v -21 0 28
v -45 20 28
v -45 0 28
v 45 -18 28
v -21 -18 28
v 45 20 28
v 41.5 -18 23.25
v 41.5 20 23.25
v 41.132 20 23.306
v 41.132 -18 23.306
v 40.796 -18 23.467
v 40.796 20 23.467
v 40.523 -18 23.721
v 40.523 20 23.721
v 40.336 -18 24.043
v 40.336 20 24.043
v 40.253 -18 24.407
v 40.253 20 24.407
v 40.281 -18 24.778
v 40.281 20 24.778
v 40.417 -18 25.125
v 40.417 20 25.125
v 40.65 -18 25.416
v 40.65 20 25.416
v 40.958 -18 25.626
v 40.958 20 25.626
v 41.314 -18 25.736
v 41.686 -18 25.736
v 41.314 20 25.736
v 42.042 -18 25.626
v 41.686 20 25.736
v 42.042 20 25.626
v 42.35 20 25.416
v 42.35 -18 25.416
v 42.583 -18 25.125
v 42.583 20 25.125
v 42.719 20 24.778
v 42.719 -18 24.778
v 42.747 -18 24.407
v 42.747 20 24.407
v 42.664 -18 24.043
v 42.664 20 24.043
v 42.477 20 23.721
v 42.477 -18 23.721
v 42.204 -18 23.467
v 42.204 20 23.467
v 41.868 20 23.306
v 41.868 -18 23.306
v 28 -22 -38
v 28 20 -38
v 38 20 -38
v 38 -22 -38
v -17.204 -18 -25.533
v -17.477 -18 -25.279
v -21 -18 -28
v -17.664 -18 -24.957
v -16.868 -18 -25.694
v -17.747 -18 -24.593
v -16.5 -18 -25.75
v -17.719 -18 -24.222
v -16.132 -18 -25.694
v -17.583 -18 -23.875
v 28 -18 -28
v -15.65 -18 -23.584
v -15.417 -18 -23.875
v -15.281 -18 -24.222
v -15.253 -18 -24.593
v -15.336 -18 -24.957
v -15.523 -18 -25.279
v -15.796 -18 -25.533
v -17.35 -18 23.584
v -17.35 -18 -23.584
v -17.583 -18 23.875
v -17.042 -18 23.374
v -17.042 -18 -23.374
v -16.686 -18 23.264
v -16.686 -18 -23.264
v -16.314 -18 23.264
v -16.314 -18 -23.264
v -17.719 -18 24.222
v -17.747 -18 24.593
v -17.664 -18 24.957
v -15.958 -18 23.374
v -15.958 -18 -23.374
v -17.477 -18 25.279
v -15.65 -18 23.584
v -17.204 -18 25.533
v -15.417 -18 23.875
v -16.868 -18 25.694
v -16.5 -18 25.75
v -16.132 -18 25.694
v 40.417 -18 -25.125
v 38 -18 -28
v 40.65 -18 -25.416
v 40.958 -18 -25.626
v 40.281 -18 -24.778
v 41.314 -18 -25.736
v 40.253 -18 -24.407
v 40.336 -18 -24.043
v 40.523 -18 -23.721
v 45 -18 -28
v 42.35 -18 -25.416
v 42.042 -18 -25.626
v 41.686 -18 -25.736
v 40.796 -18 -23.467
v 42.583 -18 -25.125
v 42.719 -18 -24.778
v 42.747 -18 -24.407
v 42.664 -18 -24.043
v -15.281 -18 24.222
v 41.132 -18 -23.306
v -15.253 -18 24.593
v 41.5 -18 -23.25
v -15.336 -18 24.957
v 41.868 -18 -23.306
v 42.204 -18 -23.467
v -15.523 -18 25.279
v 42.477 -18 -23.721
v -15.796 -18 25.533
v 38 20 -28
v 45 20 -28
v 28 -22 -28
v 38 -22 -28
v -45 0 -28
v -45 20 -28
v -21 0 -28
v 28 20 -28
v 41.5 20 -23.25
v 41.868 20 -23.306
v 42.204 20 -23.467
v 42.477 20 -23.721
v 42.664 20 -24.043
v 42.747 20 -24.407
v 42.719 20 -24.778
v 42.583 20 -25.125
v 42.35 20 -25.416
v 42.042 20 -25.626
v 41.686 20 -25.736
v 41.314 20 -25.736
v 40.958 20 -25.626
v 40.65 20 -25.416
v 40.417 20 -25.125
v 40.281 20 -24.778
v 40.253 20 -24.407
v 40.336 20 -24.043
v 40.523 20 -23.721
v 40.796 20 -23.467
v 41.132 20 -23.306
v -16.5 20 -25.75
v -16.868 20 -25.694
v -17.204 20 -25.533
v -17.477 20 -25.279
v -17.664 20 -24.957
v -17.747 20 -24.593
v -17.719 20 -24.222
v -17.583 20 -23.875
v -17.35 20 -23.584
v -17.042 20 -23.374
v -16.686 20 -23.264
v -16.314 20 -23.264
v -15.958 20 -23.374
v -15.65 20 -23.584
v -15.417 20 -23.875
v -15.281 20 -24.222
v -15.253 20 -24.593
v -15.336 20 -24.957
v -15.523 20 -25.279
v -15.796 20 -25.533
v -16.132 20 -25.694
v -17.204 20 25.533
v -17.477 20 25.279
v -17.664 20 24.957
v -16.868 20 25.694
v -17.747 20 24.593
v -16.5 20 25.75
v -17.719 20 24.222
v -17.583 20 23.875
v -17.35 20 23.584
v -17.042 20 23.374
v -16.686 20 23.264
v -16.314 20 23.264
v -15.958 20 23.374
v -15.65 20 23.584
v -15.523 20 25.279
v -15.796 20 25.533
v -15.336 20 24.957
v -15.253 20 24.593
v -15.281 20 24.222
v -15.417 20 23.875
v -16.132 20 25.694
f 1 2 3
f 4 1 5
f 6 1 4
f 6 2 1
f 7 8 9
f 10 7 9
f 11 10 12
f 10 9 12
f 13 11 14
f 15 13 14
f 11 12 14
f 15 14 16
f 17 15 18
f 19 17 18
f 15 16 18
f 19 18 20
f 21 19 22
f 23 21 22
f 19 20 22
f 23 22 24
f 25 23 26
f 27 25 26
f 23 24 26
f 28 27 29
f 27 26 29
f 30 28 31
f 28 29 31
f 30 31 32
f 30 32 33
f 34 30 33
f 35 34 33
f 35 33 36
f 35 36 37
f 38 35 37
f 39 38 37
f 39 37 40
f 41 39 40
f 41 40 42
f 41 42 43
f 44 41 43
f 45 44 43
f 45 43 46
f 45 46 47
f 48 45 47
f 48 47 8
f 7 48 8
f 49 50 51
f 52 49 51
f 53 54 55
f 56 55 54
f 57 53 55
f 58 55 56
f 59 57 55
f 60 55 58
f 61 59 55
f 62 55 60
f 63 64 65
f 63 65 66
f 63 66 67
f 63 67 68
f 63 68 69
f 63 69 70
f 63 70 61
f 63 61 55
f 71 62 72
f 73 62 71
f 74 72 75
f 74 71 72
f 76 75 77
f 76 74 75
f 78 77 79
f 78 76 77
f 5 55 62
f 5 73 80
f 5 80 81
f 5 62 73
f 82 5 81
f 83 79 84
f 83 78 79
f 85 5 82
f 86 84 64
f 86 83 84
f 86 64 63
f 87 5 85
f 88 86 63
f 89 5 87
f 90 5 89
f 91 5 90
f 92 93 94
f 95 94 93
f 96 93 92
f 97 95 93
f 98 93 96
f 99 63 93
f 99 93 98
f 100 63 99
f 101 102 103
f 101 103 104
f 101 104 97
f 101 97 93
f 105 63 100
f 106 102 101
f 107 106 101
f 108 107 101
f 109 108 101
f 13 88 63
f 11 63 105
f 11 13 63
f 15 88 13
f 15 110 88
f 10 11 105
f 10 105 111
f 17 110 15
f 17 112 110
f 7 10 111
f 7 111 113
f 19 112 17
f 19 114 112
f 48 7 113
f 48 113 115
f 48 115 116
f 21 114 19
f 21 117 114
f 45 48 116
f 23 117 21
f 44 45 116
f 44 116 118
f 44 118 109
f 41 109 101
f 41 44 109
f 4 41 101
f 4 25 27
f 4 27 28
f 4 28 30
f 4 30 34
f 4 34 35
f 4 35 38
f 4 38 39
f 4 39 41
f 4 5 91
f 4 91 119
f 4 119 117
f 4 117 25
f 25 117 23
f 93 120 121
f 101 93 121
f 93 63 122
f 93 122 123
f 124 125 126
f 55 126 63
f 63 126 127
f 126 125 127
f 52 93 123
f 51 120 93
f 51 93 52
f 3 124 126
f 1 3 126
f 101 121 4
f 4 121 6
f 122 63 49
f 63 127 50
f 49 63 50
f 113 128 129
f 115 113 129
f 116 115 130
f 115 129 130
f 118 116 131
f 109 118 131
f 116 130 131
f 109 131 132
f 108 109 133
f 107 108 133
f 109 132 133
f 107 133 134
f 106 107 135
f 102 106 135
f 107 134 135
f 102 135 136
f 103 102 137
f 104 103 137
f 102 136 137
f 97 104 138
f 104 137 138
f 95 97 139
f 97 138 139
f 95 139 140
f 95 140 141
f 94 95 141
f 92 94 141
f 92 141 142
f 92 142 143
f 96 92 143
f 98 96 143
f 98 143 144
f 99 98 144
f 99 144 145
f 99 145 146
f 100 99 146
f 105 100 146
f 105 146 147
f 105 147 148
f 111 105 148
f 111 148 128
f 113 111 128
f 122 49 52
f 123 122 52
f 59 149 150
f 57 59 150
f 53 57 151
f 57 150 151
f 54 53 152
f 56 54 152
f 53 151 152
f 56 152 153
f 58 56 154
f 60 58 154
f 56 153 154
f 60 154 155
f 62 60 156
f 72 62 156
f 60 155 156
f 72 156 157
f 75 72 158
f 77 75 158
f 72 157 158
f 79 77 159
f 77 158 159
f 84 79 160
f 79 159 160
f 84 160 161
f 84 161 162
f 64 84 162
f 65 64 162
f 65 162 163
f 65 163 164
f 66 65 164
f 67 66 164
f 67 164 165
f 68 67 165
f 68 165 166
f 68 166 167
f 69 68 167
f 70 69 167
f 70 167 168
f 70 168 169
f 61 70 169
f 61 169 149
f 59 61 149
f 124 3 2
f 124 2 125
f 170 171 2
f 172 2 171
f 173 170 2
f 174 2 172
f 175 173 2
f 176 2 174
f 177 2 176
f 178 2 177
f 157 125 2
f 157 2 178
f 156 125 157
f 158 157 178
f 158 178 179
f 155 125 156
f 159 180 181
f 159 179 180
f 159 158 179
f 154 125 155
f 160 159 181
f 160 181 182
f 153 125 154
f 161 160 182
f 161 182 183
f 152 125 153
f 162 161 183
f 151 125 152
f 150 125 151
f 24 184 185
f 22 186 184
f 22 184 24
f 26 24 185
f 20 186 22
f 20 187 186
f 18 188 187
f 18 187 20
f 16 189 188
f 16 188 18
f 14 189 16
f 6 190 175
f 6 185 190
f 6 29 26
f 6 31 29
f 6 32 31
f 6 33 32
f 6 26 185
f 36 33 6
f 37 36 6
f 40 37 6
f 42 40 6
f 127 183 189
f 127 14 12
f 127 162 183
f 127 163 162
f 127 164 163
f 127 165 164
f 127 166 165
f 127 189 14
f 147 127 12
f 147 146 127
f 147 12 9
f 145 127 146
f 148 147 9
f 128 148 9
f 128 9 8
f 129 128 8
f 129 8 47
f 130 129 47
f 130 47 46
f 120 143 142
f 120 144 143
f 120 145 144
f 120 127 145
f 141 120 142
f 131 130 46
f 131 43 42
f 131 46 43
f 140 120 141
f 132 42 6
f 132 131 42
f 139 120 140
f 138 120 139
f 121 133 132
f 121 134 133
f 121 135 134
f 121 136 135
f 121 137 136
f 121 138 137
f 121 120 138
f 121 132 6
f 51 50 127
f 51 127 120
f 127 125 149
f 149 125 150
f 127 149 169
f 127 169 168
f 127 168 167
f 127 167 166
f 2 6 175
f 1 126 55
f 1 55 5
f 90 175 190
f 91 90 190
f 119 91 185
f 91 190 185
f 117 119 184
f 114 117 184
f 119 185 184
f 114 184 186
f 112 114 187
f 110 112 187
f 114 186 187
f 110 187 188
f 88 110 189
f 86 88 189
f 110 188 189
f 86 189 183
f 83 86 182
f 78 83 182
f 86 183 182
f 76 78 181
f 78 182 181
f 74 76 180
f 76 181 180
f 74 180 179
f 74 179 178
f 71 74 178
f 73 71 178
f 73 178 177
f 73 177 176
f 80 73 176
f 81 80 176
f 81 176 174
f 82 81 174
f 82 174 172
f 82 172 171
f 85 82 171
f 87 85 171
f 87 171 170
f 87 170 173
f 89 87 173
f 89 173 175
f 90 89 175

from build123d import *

# Parameters (mm, degrees)
SKETCH_1_W          = 90
SKETCH_1_H          = 56
EXTRUDE_1_DEPTH     = 20
SKETCH_4_W          = 66
SKETCH_4_H          = 56
EXTRUDE_3_DEPTH     = 18
SKETCH_2_R          = 1.25
CUT_EXTRUDE_1_DEPTH = 60
SKETCH_5_W          = 10
SKETCH_5_H          = 10
EXTRUDE_4_DEPTH     = 42


with BuildPart() as part:
    # 草图1 → 凸台-拉伸1 (new body)
    with BuildSketch(Plane(origin=(0, 0, 0), x_dir=(1, 0, 0), z_dir=(0, 1, 0))):
        Rectangle(SKETCH_1_W, SKETCH_1_H)
    extrude(amount=EXTRUDE_1_DEPTH)

    # 草图4 → 凸台-拉伸3 (add)
    with BuildSketch(Plane.XZ):
        with Locations((12, 0)):
            Rectangle(SKETCH_4_W, SKETCH_4_H)
    extrude(amount=EXTRUDE_3_DEPTH)

    # 草图2 → 切除-拉伸1 (cut)
    with BuildSketch(Plane(origin=(0, 20, 0), x_dir=(1, 0, 0), z_dir=(0, 1, 0))):
        with Locations(Location((41.5, 24.5, 0), (0, 0, 270))):
            Circle(SKETCH_2_R)
        with Locations(Location((41.5, -24.5, 0), (0, 0, 90))):
            Circle(SKETCH_2_R)
        with Locations(Location((-16.5, -24.5, 0), (0, 0, 270))):
            Circle(SKETCH_2_R)
        with Locations(Location((-16.5, 24.5, 0), (0, 0, 90))):
            Circle(SKETCH_2_R)
    extrude(amount=-CUT_EXTRUDE_1_DEPTH, mode=Mode.SUBTRACT)

    # 草图5 → 凸台-拉伸4 (add)
    with BuildSketch(Plane(origin=(0, 20, 0), x_dir=(1, 0, 0), z_dir=(0, 1, 0))):
        with Locations((33, 33)):
            Rectangle(SKETCH_5_W, SKETCH_5_H)
    extrude(amount=-EXTRUDE_4_DEPTH)


solid = part.part
